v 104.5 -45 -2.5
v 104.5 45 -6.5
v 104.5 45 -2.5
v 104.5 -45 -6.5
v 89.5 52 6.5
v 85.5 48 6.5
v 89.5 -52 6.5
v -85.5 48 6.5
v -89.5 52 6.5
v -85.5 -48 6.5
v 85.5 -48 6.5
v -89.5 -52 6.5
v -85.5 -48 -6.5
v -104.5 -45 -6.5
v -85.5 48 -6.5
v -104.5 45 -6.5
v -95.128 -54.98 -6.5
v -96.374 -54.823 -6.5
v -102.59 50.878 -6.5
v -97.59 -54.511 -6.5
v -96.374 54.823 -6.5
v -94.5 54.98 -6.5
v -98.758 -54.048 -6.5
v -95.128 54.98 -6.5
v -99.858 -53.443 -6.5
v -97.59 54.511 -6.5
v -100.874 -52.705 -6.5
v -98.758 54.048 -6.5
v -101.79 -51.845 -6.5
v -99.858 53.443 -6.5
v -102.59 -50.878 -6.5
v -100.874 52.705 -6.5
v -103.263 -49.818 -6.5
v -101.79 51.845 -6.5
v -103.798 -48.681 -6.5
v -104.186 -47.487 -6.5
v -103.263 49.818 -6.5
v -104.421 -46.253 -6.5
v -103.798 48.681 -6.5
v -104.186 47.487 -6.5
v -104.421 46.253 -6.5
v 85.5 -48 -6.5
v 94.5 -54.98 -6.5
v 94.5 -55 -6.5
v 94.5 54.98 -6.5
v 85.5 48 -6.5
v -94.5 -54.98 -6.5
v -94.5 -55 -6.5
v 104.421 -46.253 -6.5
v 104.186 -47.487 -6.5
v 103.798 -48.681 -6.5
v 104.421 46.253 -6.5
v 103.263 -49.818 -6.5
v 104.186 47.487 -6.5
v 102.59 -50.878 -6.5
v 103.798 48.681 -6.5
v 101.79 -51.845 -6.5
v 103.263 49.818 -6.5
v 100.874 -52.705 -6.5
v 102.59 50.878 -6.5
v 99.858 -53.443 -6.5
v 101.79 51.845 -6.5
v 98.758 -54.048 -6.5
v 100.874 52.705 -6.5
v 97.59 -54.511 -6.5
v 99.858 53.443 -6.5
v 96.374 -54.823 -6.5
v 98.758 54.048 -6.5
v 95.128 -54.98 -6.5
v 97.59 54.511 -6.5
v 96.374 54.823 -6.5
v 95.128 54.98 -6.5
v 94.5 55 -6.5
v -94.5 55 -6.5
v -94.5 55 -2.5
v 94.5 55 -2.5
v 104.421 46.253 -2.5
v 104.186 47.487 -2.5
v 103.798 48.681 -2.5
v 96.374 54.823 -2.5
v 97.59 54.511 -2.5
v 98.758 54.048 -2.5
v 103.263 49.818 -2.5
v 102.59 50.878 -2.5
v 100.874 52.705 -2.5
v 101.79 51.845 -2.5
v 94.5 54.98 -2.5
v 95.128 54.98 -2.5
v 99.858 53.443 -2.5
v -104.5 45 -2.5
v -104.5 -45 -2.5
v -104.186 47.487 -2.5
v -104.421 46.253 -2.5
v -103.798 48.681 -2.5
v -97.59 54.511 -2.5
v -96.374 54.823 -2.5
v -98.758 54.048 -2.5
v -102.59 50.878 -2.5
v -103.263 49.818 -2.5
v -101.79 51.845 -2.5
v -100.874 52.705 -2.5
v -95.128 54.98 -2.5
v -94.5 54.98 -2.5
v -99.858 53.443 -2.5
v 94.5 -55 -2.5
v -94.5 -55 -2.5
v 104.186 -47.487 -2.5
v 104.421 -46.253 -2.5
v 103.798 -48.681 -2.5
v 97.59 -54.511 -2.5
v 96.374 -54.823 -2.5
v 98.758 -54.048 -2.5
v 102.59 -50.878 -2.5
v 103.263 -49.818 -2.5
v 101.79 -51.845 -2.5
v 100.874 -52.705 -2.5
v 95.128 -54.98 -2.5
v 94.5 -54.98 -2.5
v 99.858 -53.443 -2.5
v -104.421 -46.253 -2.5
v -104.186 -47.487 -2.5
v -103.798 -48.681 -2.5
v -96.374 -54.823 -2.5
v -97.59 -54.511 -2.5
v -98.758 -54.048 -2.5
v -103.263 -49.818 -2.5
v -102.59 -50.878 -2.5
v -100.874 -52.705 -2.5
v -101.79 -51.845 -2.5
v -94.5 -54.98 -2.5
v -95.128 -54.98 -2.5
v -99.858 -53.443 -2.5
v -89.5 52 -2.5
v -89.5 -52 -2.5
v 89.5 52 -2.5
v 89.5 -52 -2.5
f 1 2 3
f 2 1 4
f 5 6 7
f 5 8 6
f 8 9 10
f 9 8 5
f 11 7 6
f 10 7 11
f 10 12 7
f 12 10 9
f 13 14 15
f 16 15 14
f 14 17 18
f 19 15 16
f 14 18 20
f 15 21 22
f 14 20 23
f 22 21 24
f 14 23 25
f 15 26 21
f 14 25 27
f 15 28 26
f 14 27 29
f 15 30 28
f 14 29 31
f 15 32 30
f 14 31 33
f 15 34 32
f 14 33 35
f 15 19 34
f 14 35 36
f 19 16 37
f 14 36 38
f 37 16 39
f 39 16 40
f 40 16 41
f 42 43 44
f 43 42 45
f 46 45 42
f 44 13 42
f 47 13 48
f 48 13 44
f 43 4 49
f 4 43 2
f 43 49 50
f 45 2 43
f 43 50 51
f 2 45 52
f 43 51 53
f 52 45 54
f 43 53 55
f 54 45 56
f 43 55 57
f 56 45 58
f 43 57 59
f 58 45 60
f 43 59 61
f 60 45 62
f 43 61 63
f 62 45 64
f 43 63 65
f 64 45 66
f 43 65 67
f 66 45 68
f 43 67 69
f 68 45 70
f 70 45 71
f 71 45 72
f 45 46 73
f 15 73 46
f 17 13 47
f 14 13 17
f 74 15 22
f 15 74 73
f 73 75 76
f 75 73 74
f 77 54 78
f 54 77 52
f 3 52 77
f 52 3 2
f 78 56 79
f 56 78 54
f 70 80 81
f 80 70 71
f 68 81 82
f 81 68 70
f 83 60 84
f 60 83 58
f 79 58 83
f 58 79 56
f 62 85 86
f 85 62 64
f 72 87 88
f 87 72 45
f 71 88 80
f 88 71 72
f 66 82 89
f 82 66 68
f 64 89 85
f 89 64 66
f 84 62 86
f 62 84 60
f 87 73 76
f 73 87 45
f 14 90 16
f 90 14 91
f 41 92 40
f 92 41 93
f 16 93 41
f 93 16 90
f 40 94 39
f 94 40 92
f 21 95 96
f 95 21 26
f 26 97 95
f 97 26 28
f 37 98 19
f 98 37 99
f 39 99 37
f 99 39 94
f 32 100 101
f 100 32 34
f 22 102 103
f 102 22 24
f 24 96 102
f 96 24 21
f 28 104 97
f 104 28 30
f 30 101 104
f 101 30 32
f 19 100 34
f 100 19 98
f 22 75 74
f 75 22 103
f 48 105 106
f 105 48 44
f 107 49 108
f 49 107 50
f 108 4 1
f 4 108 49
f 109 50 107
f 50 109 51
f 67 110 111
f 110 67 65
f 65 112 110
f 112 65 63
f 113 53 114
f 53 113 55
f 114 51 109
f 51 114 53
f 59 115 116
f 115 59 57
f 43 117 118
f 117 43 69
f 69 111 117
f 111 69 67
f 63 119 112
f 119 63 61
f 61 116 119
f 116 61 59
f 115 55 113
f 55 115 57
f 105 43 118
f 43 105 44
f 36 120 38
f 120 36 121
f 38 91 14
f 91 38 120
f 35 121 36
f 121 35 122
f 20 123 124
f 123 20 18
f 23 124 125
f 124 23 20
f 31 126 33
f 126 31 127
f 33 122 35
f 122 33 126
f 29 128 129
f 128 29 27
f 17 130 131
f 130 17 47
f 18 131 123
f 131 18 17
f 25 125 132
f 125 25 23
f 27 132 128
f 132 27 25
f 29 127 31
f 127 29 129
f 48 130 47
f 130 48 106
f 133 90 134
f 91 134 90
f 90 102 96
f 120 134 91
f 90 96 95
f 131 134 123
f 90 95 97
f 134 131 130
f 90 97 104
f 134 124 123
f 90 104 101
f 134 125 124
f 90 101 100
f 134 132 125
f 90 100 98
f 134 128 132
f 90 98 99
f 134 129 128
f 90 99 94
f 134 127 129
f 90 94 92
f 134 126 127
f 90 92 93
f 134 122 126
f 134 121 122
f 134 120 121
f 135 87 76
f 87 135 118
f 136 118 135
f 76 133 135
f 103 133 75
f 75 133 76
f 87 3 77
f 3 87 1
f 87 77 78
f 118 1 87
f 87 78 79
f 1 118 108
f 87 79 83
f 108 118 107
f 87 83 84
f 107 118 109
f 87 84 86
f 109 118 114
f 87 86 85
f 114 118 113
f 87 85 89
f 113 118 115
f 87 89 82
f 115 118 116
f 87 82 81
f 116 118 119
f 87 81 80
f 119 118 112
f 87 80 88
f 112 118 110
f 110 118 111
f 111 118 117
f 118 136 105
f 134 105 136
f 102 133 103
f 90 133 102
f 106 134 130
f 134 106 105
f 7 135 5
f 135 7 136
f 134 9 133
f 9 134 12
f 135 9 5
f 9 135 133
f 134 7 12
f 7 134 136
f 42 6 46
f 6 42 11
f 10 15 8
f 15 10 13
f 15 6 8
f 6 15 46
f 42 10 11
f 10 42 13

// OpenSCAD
outerWidth = 209;
depth = 13;
outerHeight = 110;
// Width of the inner void
innerWidth = 171;
// Height of the inner void
innerHeight = 96;
// For round corners
faceRadius = 10;
// Affects how strong the wall will be
innerWallThickness = 4;
// Save material by having a narrow face.
faceThickness = 4;
// Smoothness of the corners
numFragments = 50;

difference() {
    cube([outerWidth, outerHeight, depth], center = true);
    // Create inner void
    cube([innerWidth, innerHeight, depth], center = true);
    
    // Corner rounding
    for(a = [0, 180]) {
        for(b = [0, 180]) {
            rotate([a, b, 0]) {
                translate([outerWidth / 2 - faceRadius, outerHeight / 2 - faceRadius, 0]) {
                    intersection() {
                        difference() {
                            cube([faceRadius * 2, faceRadius * 2, depth], center = true);
                            cylinder(depth, faceRadius, faceRadius, center = true, $fn = numFragments);
                            
                        }
                        translate([faceRadius / 2, faceRadius / 2, 0]) {
                            cube([faceRadius, faceRadius, depth], center = true);
                        }
                    }

                }
            }
        }
    }

    // Remove material behind the face for savings
    translate([0, 0, faceThickness]) {
        difference() {
            cube([outerWidth, outerHeight, depth], center = true);
            cube([innerWidth + innerWallThickness * 2, innerHeight + innerWallThickness * 2, depth], center = true);
        }
    }
}
